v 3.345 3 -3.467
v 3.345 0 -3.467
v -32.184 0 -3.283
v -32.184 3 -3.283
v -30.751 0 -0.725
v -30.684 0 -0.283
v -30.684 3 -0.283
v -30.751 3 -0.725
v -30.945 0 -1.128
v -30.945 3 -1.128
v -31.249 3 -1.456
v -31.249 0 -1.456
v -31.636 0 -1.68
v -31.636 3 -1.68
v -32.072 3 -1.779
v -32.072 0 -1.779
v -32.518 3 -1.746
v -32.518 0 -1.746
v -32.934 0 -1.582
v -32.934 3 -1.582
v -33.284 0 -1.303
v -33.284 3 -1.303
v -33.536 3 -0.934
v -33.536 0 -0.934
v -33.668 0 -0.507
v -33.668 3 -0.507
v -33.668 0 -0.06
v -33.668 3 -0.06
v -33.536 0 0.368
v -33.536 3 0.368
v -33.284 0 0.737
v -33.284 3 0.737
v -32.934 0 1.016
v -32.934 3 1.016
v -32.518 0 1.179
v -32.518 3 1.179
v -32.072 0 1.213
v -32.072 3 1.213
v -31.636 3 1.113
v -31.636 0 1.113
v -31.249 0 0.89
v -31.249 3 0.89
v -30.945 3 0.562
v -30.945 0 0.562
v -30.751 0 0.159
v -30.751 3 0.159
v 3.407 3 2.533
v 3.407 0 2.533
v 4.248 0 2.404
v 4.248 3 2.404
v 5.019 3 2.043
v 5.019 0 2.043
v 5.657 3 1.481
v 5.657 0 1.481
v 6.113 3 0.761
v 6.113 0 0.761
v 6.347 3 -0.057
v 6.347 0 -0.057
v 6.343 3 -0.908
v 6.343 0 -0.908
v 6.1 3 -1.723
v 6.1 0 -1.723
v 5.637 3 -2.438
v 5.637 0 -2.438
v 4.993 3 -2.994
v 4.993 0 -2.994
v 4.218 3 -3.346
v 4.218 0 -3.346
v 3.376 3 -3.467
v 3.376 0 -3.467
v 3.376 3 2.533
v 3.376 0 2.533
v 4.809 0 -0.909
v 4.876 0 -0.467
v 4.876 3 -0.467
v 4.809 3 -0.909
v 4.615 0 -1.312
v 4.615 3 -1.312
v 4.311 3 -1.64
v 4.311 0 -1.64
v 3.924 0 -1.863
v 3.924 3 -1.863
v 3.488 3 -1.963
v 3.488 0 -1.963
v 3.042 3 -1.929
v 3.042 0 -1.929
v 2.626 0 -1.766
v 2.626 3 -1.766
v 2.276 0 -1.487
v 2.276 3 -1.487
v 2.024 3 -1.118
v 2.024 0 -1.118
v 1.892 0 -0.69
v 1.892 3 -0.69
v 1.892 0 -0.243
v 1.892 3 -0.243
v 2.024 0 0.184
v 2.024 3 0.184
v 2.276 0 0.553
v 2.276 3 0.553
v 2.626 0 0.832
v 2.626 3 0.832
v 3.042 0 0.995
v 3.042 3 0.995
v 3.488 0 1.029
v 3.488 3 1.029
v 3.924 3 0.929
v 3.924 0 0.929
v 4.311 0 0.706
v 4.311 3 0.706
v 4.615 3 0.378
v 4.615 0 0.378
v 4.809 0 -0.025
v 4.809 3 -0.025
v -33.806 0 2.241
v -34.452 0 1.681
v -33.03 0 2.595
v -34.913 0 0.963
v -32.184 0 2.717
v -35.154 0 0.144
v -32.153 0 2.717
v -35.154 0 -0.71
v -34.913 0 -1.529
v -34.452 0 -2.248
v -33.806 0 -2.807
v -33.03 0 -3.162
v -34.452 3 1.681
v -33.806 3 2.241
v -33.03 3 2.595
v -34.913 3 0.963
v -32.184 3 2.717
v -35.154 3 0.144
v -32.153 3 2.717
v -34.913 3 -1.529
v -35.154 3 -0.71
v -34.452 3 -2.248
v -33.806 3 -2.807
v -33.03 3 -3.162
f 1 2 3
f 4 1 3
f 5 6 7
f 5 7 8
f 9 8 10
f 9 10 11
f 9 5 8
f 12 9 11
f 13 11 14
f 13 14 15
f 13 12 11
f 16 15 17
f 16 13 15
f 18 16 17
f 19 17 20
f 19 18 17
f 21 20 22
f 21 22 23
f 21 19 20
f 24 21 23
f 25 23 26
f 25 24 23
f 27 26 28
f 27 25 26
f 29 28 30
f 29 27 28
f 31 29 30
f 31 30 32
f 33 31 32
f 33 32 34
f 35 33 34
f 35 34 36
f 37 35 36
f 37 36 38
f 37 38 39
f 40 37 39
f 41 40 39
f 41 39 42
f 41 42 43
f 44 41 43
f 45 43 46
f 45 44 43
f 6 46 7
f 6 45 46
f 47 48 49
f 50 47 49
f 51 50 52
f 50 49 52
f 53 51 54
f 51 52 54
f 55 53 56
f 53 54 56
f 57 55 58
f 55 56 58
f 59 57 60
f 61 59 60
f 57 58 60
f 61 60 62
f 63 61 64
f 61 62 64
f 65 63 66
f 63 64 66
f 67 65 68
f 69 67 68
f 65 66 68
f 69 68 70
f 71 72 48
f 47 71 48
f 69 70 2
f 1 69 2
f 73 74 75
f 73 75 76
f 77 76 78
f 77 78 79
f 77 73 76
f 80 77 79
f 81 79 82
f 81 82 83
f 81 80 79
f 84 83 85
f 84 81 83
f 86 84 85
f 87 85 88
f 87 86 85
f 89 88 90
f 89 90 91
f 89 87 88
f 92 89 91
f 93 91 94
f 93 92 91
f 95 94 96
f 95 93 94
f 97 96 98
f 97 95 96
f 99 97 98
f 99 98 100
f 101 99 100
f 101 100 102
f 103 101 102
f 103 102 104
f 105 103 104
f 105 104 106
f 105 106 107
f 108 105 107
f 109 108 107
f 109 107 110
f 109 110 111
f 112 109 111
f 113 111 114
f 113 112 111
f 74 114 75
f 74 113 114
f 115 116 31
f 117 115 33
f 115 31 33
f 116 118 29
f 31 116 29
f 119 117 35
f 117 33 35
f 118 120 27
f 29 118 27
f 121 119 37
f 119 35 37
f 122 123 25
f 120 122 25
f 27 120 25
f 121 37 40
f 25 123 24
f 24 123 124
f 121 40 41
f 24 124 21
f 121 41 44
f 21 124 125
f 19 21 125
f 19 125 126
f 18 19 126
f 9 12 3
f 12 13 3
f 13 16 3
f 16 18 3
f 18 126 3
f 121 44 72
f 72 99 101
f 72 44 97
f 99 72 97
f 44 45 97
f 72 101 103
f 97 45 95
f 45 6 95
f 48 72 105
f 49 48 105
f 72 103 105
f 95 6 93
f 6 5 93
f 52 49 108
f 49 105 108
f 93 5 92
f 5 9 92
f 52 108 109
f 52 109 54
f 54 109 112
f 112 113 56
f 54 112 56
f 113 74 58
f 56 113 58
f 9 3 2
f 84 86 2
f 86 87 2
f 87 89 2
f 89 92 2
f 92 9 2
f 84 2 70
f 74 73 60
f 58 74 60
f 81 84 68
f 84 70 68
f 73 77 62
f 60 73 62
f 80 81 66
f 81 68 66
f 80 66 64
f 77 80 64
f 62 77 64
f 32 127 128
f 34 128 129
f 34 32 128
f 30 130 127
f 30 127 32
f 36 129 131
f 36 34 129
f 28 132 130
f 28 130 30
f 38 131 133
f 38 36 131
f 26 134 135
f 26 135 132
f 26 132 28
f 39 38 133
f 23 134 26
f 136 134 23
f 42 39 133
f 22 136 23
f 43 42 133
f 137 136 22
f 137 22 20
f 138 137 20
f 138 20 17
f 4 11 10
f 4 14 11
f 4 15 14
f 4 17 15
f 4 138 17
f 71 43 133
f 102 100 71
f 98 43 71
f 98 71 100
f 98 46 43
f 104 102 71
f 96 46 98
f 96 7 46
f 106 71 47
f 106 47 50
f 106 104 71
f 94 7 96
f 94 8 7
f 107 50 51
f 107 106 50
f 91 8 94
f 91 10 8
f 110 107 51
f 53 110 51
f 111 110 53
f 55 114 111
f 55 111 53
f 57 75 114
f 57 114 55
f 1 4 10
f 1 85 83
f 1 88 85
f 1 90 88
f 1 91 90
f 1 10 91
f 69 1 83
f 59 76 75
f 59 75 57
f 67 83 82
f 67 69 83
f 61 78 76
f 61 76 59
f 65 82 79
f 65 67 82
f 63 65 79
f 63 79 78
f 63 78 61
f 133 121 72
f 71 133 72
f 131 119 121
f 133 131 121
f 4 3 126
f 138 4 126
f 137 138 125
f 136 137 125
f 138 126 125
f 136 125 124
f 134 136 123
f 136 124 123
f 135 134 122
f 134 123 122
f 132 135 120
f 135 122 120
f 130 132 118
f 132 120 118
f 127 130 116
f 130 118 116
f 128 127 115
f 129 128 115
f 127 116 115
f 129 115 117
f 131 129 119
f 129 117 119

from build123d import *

# Parameters (mm, degrees)
SKETCH1_R           = 1.5
BOSS_EXTRUDE1_DEPTH = 3


with BuildPart() as part:
    # Sketch1 → Boss-Extrude1 (new body)
    with BuildSketch(Plane(origin=(0, 0, 0), x_dir=(1, 0, 0), z_dir=(0, 1, 0))):
        with BuildLine():
            Line((3.344532209, 3.466749545), (-32.184472752, 3.283207502))
            ThreePointArc((-32.184472752, 3.283207502), (-35.184472752, 0.283207502), (-32.184472752, -2.716792498))
            Line((-32.184472752, -2.716792498), (-32.153477714, -2.716632379))
            Line((-32.153477714, -2.716632379), (3.375527237, -2.533090335))
            Line((3.375527237, -2.533090335), (3.406522296, -2.532930216))
            ThreePointArc((3.406522296, -2.532930216), (6.375487217, 0.482407396), (3.375527248, 3.466909665))
            Line((3.375527248, 3.466909665), (3.344532209, 3.466749545))
        make_face()
        with Locations((-32.184472752, 0.283207502)):
            Circle(SKETCH1_R, mode=Mode.SUBTRACT)
        with Locations((3.375527248, 0.466909665)):
            Circle(SKETCH1_R, mode=Mode.SUBTRACT)
    extrude(amount=BOSS_EXTRUDE1_DEPTH)


solid = part.part
